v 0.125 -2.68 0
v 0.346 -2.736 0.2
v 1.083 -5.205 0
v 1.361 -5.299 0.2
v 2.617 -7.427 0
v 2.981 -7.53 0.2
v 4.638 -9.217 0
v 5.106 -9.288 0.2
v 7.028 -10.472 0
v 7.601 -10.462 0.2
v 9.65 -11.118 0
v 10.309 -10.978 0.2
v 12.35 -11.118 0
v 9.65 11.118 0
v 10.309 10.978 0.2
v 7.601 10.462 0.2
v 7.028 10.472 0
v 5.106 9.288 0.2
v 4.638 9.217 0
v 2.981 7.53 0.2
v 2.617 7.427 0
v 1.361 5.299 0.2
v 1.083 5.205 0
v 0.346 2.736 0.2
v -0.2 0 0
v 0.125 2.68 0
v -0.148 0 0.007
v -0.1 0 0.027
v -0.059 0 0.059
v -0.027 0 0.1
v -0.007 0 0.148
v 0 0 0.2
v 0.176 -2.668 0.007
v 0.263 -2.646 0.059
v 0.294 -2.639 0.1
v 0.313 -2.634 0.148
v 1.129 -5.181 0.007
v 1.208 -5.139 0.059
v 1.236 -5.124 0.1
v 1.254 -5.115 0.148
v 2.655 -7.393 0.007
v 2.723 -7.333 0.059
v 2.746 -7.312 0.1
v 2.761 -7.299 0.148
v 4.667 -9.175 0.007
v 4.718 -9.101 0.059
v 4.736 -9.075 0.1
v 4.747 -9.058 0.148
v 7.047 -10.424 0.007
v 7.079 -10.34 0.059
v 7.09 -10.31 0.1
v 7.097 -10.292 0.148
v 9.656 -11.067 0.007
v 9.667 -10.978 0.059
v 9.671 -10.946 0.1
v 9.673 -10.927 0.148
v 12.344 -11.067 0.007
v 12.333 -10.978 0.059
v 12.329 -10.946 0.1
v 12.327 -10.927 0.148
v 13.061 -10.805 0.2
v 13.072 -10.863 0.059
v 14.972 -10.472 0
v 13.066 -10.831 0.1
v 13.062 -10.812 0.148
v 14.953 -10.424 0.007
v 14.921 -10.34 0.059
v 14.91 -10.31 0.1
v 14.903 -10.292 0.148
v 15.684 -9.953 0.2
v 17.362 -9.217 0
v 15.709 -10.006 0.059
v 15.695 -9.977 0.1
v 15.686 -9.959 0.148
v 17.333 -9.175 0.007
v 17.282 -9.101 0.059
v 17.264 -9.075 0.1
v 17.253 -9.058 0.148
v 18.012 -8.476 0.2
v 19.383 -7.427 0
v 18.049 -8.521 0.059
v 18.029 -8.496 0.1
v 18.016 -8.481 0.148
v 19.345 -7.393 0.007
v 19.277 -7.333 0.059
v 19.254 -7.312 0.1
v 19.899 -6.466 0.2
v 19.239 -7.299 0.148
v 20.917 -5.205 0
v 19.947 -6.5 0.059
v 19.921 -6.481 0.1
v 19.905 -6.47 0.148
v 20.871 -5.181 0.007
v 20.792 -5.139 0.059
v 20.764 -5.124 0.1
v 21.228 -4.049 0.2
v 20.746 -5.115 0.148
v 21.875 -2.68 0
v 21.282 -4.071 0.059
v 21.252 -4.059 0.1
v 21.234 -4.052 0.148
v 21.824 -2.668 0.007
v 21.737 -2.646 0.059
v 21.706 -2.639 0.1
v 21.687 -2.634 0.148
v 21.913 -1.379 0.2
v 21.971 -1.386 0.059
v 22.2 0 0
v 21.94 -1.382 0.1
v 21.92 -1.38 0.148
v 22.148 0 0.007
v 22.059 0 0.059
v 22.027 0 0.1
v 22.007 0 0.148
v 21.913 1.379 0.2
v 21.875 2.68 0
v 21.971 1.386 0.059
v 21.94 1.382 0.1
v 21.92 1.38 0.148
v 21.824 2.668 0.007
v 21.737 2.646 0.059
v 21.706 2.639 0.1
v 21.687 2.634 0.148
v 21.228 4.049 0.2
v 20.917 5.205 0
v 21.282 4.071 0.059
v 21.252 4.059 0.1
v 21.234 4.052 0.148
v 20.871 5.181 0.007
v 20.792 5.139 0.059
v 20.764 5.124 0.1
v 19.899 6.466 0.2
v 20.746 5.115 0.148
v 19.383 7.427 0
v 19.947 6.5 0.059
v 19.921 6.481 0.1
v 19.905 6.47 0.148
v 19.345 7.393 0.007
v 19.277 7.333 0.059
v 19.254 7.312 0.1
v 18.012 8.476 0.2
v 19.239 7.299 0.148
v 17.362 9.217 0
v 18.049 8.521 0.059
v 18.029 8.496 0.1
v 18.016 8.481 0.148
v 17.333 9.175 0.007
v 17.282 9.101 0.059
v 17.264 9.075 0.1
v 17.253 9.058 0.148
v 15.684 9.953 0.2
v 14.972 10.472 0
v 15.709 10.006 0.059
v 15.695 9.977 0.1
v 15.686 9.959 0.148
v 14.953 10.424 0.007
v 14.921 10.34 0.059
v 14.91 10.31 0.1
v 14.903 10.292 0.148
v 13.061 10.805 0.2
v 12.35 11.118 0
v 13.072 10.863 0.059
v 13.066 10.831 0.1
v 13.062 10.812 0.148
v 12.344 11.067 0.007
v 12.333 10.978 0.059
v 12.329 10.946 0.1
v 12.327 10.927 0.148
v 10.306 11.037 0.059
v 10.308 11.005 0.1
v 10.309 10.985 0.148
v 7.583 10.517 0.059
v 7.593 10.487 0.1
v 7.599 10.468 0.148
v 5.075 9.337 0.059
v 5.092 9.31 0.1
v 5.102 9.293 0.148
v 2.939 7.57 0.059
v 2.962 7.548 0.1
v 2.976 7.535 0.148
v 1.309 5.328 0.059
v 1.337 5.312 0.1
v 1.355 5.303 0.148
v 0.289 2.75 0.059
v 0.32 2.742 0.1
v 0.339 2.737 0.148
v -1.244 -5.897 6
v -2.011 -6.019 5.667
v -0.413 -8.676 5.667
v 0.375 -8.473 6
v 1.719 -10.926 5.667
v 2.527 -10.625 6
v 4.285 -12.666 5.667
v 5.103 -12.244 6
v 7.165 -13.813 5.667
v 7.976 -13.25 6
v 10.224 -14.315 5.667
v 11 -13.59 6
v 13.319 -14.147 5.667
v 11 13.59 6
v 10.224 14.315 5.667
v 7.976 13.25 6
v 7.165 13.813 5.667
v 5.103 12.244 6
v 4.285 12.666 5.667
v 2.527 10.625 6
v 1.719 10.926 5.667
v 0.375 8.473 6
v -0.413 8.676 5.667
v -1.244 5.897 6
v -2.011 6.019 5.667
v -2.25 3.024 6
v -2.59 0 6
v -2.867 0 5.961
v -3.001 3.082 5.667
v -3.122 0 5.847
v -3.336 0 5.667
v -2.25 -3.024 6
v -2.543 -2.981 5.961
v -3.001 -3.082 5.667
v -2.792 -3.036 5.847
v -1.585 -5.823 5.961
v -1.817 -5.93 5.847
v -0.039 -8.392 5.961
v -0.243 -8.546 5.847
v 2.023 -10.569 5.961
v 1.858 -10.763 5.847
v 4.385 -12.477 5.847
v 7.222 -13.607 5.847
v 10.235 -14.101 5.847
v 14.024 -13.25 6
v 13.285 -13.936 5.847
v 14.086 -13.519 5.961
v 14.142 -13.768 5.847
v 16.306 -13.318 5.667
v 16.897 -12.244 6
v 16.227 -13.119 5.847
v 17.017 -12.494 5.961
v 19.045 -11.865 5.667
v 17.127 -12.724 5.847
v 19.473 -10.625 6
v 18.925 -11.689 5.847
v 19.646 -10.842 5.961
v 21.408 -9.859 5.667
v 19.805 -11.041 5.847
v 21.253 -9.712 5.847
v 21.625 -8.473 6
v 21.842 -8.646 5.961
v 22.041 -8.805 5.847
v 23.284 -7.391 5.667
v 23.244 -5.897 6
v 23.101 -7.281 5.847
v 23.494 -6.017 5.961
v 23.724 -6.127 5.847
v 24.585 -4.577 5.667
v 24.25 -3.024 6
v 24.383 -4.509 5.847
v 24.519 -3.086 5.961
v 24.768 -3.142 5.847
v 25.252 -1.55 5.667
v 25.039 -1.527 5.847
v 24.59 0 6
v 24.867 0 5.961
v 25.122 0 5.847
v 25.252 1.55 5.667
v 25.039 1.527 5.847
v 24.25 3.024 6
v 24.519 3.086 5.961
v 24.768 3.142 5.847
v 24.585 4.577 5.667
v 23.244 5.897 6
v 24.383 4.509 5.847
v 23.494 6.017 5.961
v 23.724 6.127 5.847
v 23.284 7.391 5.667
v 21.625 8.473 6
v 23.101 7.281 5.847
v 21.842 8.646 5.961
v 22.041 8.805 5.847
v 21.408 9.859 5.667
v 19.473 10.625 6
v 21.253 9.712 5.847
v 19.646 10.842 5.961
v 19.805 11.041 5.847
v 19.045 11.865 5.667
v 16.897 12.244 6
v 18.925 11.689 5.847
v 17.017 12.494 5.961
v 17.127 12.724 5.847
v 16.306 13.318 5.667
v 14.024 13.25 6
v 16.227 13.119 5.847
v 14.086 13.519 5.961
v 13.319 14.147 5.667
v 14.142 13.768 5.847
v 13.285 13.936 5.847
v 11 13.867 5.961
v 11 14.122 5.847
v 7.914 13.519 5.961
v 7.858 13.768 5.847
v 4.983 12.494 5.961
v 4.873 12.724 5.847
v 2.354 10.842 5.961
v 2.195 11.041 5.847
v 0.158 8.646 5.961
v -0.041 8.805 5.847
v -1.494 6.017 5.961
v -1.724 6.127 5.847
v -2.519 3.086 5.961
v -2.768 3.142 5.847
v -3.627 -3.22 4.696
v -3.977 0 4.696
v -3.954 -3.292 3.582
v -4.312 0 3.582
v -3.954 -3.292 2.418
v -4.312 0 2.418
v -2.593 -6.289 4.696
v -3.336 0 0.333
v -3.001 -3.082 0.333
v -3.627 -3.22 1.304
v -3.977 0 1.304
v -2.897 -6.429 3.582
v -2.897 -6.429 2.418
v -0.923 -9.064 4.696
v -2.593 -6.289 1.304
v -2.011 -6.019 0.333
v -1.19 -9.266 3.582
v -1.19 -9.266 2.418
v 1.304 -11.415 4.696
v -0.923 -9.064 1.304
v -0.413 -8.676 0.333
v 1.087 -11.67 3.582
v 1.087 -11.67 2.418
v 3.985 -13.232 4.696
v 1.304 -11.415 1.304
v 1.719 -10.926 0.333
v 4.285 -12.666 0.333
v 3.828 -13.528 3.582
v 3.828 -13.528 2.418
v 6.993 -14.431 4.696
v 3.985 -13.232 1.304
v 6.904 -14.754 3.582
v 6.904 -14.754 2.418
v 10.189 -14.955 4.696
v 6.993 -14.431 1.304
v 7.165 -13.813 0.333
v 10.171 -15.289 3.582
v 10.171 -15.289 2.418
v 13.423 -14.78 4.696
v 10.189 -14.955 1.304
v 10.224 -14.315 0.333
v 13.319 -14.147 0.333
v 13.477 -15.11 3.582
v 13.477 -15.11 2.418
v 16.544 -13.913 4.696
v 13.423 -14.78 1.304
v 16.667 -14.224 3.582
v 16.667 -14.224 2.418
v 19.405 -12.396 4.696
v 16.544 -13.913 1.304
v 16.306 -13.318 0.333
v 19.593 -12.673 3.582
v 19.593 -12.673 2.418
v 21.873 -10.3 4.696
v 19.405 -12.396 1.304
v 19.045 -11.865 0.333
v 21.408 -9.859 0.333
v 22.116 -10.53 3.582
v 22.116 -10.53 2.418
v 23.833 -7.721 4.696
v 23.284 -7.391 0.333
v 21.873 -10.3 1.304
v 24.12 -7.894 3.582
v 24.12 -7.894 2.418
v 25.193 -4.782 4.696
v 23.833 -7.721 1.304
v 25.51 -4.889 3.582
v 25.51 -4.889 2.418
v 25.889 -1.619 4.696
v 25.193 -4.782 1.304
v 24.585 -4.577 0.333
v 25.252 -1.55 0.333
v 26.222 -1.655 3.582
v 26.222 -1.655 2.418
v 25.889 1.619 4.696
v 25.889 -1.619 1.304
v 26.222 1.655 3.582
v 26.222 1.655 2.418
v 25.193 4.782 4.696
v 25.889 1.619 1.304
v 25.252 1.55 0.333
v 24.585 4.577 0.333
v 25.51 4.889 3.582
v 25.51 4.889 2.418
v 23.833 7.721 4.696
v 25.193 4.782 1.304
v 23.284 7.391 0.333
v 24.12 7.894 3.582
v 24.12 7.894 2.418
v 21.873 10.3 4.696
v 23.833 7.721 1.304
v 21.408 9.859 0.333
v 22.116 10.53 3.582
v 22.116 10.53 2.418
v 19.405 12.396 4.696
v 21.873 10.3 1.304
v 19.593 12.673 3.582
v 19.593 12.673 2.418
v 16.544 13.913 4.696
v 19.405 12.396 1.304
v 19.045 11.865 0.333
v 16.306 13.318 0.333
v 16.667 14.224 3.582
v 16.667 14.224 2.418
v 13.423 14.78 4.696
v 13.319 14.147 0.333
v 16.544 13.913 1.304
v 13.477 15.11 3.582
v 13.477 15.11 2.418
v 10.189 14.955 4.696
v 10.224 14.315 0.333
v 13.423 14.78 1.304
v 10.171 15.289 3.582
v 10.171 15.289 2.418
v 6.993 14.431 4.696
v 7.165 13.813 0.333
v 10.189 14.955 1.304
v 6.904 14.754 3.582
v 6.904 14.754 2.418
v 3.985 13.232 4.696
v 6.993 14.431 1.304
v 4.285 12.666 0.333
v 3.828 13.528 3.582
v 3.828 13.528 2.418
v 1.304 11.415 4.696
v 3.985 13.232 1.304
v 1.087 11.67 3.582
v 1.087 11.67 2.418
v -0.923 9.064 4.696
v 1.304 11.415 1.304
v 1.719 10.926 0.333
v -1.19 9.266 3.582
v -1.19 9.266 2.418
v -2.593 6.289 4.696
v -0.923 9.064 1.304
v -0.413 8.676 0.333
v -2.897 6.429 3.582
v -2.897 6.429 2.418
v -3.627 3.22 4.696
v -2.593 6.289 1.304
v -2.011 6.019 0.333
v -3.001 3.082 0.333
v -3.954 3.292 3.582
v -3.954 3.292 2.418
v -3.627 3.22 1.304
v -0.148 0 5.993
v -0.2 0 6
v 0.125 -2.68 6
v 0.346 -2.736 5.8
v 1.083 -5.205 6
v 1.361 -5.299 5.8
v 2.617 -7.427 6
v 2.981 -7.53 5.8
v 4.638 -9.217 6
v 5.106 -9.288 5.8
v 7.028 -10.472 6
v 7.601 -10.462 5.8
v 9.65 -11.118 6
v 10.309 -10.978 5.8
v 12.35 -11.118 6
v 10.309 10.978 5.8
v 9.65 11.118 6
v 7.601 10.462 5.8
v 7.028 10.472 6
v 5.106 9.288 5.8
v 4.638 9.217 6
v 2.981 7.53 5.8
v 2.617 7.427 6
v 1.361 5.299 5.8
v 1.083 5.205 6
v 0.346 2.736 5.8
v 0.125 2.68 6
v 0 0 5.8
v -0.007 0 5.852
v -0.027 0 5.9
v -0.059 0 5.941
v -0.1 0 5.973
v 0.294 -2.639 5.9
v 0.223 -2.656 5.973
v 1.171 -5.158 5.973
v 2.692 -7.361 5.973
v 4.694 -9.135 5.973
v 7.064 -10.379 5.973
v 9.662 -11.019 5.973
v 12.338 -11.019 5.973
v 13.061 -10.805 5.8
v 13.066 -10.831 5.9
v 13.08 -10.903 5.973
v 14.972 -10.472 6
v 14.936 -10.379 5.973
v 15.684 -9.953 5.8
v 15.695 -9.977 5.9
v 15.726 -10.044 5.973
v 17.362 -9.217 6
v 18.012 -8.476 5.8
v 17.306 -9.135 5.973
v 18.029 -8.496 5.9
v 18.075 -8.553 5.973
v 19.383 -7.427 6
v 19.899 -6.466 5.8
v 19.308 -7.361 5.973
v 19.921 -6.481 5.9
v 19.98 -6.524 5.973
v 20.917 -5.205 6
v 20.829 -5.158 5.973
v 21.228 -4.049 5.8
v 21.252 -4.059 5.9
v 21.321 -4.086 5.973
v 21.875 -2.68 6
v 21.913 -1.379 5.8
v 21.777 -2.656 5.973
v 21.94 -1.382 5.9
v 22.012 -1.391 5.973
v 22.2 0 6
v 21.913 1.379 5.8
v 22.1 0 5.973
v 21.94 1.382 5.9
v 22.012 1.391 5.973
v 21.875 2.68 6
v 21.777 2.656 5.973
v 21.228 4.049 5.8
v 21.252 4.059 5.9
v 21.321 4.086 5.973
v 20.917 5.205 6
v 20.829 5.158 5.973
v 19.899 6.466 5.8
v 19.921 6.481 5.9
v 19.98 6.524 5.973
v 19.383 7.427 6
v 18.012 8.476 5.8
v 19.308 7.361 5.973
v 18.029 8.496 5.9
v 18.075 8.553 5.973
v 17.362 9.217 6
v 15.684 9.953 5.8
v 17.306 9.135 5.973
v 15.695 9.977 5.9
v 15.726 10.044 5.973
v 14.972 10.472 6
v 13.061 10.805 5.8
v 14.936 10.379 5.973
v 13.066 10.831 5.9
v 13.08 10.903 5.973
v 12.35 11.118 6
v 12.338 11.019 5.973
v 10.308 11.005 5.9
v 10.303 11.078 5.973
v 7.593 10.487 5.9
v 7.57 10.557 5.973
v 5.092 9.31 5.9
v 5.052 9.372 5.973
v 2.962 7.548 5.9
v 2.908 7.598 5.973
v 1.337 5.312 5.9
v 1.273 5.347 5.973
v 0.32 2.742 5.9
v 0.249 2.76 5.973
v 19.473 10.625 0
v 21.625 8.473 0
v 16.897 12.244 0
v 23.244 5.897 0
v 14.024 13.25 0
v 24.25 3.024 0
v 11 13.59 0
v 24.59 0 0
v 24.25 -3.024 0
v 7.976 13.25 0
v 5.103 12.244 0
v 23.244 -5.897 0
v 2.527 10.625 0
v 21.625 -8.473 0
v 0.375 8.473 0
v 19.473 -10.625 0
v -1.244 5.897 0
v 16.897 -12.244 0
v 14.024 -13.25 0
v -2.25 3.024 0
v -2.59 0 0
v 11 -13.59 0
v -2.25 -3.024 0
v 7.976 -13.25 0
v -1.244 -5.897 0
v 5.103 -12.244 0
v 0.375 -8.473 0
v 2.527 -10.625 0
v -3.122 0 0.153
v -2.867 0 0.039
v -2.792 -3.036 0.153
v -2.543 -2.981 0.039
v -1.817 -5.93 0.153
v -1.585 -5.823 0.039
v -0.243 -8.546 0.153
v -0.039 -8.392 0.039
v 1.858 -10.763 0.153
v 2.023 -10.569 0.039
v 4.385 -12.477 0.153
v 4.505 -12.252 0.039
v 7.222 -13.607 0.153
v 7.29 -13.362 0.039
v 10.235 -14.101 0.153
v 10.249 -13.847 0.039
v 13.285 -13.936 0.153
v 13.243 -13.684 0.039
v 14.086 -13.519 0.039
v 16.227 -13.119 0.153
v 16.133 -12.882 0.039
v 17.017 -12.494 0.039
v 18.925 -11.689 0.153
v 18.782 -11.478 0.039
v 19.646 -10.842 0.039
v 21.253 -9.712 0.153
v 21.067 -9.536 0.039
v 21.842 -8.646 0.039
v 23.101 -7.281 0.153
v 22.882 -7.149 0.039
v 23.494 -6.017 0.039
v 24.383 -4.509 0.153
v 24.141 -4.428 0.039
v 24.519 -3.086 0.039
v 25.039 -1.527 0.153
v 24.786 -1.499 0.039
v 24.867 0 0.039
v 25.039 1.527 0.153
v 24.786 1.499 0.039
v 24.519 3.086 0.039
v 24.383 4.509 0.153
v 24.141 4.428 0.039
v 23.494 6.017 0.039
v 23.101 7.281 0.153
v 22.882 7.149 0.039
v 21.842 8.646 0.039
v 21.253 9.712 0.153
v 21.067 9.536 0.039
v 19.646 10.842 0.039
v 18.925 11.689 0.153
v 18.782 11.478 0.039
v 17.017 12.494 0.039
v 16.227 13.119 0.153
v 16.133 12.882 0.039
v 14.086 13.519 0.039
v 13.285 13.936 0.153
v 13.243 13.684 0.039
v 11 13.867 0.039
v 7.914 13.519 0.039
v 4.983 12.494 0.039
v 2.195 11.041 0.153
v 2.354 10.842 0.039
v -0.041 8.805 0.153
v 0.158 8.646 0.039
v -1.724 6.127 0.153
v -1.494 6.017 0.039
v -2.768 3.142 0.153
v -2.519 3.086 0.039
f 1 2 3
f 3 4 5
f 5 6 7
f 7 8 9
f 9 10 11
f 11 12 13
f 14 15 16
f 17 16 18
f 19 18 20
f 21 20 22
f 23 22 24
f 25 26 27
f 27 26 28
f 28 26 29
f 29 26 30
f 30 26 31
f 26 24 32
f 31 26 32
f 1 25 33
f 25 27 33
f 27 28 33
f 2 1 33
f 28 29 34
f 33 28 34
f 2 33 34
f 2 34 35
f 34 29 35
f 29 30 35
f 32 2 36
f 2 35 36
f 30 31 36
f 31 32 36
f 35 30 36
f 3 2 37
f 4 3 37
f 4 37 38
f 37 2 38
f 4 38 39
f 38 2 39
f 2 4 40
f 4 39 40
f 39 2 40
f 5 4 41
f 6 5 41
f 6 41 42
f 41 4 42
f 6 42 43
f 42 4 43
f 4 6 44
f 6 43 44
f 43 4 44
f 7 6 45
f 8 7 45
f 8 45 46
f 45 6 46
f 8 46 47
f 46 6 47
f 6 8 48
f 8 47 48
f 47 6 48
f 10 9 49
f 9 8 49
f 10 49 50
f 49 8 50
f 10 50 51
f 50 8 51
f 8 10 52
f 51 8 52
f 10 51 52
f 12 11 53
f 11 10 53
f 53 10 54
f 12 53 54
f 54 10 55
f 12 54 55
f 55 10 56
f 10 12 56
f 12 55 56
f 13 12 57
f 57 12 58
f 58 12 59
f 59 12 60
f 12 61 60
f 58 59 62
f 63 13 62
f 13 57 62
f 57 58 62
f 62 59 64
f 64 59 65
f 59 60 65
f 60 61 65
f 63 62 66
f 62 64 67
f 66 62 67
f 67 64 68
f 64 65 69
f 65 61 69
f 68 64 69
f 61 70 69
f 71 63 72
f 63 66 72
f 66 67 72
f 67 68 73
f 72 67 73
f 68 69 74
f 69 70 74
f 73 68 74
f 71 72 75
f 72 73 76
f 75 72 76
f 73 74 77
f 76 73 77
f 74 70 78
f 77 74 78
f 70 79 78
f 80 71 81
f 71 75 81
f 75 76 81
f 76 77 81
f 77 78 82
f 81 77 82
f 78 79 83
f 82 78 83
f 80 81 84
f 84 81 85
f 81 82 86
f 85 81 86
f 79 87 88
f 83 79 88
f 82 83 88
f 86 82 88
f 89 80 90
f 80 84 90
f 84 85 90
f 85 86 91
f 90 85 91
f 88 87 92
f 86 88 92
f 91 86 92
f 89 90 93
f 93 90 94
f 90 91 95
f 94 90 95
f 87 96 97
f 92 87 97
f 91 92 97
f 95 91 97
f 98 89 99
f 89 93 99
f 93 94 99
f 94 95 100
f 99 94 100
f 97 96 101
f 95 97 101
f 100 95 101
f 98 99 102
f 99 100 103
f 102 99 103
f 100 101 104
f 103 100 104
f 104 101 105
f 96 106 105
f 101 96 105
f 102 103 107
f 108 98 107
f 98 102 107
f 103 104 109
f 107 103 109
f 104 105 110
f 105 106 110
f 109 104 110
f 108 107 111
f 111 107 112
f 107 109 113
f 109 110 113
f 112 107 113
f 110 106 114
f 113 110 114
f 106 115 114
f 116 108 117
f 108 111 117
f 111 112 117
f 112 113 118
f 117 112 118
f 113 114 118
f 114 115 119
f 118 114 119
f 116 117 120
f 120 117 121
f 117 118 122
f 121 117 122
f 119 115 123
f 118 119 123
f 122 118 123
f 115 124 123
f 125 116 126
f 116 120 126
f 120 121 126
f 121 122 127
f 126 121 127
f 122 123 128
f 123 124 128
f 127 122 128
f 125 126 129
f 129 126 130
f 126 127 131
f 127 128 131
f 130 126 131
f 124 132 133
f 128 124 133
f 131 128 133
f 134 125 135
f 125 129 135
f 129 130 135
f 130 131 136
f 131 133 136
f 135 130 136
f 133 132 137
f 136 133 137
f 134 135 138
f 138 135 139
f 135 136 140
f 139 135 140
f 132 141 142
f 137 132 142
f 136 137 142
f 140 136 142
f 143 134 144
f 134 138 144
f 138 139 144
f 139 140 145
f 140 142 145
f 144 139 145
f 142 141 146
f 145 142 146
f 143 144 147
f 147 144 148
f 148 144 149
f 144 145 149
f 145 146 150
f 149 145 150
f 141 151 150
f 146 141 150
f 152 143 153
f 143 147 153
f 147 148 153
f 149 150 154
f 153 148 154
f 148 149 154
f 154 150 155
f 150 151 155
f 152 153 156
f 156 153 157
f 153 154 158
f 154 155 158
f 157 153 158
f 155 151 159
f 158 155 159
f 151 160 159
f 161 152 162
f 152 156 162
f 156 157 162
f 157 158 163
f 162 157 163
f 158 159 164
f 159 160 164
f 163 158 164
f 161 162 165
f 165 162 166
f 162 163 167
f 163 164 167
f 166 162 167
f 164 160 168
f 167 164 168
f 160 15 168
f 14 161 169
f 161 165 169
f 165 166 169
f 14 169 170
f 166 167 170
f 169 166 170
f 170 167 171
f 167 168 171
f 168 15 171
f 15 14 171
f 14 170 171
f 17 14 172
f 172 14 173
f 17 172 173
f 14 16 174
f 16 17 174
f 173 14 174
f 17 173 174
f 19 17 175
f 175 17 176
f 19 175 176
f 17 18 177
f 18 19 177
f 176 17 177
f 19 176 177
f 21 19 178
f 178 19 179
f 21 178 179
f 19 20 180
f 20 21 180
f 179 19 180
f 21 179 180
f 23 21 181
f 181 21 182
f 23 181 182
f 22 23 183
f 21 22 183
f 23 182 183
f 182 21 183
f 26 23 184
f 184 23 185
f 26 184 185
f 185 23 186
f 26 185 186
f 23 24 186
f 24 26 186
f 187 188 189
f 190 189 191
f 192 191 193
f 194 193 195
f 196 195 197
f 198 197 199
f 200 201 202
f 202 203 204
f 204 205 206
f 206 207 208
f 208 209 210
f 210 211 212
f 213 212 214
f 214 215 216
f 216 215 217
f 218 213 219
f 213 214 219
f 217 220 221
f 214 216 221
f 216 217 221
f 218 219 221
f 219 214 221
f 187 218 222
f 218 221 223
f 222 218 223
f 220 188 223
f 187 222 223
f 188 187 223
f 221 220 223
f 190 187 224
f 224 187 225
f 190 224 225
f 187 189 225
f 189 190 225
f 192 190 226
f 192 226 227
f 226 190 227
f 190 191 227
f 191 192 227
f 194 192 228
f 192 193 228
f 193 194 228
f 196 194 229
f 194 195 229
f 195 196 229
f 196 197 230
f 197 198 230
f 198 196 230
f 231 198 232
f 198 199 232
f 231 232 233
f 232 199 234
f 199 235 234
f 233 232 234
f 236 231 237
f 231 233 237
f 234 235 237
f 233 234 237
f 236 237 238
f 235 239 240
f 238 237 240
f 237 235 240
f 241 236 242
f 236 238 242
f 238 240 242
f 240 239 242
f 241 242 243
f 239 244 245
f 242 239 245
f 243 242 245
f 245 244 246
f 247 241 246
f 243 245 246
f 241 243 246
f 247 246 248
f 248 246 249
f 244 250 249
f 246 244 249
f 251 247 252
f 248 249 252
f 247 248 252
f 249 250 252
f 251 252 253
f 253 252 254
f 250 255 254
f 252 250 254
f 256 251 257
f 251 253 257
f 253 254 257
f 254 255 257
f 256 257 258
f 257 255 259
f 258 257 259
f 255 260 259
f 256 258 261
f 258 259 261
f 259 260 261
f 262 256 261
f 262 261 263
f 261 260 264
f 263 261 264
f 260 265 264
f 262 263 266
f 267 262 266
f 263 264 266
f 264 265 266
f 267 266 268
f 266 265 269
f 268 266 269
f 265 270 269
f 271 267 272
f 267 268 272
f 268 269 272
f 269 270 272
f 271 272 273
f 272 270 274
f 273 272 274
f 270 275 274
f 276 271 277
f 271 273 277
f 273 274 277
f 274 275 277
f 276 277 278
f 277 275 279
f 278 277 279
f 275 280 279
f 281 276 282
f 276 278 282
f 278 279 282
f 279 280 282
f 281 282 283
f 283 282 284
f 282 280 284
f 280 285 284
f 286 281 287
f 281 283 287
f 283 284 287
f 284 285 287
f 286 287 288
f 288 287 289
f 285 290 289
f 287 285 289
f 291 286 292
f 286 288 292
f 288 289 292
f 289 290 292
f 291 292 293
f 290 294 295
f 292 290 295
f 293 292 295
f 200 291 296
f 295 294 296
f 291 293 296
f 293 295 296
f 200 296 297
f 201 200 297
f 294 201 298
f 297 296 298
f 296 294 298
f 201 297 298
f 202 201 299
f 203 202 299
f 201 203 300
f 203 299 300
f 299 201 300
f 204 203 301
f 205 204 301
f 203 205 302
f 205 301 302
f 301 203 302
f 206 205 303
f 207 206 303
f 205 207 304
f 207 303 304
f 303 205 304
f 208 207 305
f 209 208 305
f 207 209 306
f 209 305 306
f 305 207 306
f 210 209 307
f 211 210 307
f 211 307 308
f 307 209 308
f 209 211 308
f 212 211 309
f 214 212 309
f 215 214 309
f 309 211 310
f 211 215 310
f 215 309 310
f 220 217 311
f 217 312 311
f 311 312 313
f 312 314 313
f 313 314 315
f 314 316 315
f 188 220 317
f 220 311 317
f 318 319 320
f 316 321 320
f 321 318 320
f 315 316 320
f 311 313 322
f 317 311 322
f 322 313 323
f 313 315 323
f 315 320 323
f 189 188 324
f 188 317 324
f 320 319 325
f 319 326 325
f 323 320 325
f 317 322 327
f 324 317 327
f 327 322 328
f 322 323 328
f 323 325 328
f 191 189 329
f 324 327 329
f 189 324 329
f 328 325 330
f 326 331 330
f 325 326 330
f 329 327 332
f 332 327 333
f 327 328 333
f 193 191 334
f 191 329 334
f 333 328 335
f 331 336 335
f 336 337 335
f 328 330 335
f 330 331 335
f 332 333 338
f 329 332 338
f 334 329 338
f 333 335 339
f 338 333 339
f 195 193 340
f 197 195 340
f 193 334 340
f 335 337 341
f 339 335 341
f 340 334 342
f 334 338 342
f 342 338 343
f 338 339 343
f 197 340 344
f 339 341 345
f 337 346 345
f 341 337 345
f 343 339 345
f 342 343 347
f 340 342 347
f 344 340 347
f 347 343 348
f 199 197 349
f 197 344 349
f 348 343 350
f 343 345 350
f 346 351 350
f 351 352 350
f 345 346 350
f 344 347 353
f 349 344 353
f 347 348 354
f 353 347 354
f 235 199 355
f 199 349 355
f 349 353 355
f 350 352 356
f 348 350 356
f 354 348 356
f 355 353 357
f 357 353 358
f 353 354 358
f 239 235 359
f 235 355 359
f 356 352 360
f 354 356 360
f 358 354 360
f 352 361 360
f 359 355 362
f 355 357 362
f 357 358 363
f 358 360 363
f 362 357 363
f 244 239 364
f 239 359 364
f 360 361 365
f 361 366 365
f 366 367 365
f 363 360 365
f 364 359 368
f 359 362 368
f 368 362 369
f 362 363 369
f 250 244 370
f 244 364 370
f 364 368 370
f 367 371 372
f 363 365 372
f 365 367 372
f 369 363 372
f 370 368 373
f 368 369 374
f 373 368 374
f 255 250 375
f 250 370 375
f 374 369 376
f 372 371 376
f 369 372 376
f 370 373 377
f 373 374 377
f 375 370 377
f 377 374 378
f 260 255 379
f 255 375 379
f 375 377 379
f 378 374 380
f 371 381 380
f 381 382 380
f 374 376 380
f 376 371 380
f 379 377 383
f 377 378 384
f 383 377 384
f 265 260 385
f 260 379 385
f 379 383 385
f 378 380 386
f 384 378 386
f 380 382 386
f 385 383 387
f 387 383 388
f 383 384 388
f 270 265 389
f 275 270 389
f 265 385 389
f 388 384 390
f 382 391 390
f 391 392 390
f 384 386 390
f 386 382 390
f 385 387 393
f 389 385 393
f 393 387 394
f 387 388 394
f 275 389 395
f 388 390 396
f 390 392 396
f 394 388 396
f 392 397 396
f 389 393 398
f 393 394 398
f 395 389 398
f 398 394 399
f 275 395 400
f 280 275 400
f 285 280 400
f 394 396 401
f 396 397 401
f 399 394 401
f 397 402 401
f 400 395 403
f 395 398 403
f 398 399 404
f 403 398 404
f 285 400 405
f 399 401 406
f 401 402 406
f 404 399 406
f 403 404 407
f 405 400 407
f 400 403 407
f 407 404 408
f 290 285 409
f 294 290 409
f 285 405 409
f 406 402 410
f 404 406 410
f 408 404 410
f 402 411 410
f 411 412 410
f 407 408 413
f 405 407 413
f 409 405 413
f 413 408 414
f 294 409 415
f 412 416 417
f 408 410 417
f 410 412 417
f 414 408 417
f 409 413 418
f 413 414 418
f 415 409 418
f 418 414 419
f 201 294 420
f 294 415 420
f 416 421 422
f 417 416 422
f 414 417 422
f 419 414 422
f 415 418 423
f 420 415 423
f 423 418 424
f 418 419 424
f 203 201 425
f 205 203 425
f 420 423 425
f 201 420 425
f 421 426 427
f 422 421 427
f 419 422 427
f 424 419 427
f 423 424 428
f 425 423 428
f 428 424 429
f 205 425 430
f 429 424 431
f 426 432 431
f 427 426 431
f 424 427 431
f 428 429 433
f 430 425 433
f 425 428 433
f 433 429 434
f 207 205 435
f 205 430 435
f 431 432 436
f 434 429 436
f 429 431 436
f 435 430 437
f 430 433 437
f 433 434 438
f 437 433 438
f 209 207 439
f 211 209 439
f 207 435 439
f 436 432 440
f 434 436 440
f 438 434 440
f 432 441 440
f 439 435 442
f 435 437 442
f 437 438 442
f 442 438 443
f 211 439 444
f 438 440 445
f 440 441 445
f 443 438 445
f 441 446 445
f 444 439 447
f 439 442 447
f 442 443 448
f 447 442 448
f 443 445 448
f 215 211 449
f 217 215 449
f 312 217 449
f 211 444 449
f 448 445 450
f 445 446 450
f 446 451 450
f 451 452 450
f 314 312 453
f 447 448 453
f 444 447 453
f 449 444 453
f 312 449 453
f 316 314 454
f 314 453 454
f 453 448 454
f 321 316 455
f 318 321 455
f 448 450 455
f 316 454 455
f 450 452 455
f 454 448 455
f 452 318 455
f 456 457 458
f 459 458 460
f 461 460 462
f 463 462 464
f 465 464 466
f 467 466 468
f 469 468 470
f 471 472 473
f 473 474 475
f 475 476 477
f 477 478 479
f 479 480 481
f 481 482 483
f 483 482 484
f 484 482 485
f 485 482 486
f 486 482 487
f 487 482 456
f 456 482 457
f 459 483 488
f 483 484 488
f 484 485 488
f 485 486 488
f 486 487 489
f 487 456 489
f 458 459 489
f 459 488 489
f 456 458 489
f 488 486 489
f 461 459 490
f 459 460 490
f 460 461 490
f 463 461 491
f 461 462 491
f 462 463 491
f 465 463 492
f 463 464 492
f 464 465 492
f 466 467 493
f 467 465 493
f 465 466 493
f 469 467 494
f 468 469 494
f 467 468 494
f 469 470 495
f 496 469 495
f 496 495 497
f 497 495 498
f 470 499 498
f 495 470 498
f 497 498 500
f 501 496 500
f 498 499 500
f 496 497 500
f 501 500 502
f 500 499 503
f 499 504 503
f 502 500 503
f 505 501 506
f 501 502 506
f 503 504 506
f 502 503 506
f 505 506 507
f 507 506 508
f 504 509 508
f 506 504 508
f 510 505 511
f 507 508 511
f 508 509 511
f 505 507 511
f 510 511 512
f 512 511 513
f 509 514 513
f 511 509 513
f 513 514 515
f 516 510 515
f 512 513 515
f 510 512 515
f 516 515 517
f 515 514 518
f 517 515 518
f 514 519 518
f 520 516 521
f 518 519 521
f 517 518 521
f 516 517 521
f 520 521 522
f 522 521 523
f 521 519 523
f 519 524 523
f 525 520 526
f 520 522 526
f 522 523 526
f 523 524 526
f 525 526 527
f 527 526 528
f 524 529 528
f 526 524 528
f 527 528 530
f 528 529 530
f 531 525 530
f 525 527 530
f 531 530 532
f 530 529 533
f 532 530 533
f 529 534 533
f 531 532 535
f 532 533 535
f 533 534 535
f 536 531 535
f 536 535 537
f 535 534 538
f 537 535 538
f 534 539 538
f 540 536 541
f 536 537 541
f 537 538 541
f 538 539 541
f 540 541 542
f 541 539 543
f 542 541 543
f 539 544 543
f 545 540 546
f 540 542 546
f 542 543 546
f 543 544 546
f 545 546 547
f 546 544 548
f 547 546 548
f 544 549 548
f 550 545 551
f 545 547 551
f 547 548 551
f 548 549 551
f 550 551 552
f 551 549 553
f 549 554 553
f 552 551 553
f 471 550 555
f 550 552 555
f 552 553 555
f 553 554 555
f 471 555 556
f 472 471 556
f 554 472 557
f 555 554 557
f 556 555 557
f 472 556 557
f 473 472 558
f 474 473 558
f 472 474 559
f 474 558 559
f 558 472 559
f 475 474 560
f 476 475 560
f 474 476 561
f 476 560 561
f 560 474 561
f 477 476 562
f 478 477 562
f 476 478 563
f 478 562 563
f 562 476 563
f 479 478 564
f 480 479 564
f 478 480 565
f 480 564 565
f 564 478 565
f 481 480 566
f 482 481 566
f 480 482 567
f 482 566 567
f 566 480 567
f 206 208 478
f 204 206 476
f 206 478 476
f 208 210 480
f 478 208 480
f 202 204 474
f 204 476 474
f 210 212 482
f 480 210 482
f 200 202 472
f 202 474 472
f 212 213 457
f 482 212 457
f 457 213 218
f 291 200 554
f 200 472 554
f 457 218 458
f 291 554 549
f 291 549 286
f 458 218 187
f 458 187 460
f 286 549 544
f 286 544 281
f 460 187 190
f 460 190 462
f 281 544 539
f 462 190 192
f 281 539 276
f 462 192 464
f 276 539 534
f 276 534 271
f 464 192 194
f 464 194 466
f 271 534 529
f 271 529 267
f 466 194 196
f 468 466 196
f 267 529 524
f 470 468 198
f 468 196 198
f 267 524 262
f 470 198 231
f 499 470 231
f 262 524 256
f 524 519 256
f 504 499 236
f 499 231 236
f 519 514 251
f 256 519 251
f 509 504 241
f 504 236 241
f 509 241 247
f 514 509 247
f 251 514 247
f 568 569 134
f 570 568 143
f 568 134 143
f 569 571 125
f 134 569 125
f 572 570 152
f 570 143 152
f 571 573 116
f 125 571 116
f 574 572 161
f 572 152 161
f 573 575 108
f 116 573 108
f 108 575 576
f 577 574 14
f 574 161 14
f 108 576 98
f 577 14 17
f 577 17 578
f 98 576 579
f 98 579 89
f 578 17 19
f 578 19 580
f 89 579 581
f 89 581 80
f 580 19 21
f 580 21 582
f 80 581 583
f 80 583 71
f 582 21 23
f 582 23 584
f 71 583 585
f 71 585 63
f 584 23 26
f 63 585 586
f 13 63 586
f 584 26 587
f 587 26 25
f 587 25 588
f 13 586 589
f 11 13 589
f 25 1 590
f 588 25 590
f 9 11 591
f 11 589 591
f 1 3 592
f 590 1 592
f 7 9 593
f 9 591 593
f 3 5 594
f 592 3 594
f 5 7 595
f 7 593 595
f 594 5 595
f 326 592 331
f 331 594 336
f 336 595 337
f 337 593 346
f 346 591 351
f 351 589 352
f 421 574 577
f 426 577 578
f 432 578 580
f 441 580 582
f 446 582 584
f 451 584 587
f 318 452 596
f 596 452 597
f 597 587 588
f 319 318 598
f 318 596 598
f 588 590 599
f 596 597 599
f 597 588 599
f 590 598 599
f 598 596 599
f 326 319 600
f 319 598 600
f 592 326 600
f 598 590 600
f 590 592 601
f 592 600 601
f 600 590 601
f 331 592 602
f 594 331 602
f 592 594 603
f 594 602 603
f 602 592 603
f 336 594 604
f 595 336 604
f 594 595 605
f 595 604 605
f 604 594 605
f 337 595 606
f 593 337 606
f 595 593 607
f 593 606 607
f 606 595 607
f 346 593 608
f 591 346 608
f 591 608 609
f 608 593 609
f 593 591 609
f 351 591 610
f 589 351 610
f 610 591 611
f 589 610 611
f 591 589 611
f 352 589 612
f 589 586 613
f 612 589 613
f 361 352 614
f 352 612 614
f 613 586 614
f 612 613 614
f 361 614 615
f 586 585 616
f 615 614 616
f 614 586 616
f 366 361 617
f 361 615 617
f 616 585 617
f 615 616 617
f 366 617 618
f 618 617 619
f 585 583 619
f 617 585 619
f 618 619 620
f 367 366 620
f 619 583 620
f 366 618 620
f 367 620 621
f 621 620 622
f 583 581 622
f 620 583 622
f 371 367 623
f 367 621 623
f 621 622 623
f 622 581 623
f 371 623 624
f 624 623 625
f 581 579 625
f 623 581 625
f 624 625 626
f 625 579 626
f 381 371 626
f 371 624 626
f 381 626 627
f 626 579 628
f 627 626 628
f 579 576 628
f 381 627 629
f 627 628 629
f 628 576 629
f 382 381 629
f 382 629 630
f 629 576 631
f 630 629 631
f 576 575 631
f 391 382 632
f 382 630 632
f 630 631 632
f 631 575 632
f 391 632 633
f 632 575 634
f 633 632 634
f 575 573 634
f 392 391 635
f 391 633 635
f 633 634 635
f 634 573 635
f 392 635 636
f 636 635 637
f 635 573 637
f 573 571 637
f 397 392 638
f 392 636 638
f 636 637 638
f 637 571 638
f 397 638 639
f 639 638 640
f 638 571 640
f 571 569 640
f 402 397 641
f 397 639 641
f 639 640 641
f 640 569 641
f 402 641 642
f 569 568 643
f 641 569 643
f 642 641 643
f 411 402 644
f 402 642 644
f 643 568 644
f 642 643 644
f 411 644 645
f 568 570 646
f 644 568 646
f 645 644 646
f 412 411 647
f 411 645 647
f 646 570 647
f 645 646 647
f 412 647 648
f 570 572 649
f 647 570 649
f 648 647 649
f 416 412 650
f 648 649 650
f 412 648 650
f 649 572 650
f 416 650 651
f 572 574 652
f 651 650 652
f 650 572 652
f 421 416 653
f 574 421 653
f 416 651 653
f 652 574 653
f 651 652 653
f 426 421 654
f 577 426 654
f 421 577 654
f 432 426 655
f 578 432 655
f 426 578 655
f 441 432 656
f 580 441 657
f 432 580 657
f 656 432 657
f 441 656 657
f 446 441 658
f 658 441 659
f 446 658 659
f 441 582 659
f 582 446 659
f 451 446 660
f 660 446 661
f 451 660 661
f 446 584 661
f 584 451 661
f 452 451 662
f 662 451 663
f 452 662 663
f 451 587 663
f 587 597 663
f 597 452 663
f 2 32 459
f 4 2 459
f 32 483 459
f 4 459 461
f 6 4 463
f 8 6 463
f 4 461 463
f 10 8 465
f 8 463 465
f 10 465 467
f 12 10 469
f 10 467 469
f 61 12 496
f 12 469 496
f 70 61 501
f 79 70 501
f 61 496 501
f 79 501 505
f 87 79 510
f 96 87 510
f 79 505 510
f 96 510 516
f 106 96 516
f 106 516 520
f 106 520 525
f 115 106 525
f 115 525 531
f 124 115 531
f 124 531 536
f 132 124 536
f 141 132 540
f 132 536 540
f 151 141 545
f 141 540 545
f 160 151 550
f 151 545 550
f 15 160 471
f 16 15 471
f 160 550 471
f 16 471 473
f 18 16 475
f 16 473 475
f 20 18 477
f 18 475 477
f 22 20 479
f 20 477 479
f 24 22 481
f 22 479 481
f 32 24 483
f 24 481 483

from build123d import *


with BuildPart() as f1:
    # F0 (on Front) → F1 (revolve)
    with BuildSketch(Plane.XZ):
        with BuildLine():
            ThreePointArc((-0.2, 0), (-0.058579, 0.058579), (0, 0.2))
            Line((0, 0.2), (0, 5.8))
            ThreePointArc((0, 5.8), (-0.058579, 5.941421), (-0.2, 6))
            Line((-0.2, 6), (-2.590317, 6))
            ThreePointArc((-2.590317, 6), (-2.998565, 5.912871), (-3.335673, 5.666667))
            ThreePointArc((-3.335673, 5.666667), (-4.354249, 3), (-3.335673, 0.333333))
            ThreePointArc((-3.335673, 0.333333), (-2.998565, 0.087129), (-2.590317, 0))
            Line((-2.590317, 0), (-0.2, 0))
        make_face()
    revolve(axis=Axis((11, 0, 3), (0, 0, 1)))


solid = f1.part
